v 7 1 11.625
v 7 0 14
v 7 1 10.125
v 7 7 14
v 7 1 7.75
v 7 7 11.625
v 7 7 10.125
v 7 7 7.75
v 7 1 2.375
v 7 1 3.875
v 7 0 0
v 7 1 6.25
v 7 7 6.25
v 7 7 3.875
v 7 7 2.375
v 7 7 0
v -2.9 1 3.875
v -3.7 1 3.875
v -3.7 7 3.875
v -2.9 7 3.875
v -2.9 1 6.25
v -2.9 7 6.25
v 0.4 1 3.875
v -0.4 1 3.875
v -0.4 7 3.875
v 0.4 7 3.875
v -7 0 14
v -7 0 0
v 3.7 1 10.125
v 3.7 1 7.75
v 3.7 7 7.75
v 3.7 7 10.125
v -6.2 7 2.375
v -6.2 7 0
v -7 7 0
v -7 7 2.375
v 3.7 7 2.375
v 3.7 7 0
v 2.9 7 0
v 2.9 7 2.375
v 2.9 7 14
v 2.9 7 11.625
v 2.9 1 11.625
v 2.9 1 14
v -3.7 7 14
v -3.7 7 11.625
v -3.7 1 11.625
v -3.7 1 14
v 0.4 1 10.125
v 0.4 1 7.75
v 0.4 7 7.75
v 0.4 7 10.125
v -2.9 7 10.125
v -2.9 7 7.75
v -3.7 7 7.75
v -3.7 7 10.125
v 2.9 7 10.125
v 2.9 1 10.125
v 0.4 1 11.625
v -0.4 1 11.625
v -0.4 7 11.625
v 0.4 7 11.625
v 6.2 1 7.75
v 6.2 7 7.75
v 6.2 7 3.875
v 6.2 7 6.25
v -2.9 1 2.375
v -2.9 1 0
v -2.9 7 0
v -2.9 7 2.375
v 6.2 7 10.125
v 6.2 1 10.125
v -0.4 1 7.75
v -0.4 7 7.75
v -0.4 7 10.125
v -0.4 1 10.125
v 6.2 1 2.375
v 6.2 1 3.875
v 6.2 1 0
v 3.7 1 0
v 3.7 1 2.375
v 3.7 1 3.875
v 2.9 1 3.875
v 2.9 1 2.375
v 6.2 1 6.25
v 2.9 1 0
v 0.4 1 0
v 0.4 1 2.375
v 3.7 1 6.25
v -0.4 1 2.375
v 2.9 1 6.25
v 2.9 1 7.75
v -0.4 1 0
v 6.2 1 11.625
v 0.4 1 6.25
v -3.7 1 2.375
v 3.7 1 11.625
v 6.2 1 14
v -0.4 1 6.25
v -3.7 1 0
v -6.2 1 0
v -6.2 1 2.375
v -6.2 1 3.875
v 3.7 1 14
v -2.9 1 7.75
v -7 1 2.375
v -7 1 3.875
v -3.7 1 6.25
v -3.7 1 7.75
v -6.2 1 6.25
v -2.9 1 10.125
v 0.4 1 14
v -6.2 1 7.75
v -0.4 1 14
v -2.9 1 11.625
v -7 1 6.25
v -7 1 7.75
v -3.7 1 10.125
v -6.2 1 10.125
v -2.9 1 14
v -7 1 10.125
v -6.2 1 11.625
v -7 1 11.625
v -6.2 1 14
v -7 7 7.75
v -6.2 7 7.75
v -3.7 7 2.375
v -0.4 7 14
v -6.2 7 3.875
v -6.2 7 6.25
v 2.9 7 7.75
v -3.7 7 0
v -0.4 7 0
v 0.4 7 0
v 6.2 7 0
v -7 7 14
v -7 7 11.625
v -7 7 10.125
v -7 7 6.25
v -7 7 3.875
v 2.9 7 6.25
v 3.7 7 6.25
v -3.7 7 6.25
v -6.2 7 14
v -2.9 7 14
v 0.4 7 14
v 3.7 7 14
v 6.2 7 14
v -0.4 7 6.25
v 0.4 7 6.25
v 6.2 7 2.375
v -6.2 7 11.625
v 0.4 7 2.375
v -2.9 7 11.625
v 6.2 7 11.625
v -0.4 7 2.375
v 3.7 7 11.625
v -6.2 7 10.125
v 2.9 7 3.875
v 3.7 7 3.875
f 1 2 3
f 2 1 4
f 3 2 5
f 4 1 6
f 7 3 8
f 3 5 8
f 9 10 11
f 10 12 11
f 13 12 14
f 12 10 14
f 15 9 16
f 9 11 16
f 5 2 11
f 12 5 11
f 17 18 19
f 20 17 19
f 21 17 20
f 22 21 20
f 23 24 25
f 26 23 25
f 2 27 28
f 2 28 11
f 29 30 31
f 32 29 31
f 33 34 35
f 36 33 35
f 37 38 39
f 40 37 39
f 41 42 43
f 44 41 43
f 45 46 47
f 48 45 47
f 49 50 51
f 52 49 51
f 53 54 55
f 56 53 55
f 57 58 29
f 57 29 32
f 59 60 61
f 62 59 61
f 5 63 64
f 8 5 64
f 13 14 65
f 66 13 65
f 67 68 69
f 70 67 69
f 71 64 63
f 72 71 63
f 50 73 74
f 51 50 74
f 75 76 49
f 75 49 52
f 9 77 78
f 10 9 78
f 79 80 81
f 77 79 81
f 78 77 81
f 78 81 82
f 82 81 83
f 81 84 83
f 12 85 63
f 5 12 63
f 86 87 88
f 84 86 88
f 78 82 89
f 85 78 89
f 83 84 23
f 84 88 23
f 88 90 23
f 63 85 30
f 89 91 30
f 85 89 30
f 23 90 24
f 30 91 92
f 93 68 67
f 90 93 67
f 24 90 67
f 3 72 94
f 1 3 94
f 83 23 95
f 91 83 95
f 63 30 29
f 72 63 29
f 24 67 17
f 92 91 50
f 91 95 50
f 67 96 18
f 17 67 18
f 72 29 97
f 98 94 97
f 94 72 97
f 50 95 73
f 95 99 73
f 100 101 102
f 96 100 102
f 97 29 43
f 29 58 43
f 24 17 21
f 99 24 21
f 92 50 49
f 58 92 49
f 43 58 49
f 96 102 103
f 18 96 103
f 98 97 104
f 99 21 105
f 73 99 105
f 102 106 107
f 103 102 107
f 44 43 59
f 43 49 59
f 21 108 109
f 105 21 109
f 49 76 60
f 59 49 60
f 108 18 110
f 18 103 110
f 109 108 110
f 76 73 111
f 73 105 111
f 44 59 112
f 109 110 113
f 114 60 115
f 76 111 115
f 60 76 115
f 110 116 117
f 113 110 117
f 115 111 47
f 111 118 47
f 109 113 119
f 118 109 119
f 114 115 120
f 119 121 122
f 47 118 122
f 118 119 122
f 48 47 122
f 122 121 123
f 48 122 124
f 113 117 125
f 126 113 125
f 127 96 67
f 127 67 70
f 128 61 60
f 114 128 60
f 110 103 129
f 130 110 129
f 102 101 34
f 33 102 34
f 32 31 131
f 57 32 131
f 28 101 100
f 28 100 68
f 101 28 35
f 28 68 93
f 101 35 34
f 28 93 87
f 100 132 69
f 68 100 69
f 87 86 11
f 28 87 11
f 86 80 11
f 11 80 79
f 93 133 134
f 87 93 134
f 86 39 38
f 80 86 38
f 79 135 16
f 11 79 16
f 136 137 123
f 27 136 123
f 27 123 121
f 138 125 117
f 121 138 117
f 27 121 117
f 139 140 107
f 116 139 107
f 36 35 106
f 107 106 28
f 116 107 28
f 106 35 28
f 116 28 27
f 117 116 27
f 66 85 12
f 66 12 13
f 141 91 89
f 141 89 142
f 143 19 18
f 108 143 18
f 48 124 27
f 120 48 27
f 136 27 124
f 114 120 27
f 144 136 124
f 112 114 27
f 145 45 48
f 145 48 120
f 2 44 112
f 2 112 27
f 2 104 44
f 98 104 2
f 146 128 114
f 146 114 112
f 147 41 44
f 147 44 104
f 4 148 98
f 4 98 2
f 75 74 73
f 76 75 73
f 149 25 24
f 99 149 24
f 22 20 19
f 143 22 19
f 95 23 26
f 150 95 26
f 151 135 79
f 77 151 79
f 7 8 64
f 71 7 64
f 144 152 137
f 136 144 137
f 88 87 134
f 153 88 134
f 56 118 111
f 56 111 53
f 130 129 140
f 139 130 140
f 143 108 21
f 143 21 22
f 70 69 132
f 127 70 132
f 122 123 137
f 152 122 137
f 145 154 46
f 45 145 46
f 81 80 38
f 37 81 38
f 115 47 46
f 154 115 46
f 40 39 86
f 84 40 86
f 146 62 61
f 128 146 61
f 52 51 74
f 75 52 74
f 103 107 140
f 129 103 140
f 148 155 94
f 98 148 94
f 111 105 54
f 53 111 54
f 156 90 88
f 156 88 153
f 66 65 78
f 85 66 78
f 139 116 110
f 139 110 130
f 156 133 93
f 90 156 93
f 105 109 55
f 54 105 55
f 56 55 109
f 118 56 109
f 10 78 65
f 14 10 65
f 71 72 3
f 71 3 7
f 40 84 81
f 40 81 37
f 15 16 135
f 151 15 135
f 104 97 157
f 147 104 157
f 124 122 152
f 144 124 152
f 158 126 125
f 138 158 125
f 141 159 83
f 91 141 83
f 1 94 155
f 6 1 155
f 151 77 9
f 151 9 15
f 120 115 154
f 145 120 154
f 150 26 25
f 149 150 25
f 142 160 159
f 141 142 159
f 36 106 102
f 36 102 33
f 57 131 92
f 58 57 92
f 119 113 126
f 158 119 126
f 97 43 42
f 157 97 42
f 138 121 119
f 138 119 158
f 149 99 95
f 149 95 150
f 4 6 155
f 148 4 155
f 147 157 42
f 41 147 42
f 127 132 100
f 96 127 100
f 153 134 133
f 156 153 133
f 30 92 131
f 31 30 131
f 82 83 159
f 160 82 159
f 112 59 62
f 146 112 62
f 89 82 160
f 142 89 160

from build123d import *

# Parameters (mm, degrees)
BOSS_EXTRUDE1_DEPTH = 14
SKETCH2_W           = 1.5
SKETCH2_H           = 6
CUT_EXTRUDE1_DEPTH  = 22


with BuildPart() as part:
    # Sketch1 → Boss-Extrude1 (new body)
    with BuildSketch(Plane.XY):
        Polygon((-7, 0), (7, 0), (7, 7), (6.2, 7), (6.2, 1), (3.7, 1), (3.7, 7), (2.9, 7), (2.9, 1), (0.4, 1), (0.4, 7), (-0.4, 7), (-0.4, 1), (-2.9, 1), (-2.9, 7), (-3.7, 7), (-3.7, 1), (-6.2, 1), (-6.2, 7), (-7, 7), align=None)
    extrude(amount=BOSS_EXTRUDE1_DEPTH)

    # Sketch2 → Cut-Extrude1 (cut, through all)
    with BuildSketch(Plane.ZY.offset(7)):
        with Locations((3.125, 4)):
            Rectangle(SKETCH2_W, SKETCH2_H)
        with Locations((7, 4)):
            Rectangle(SKETCH2_W, SKETCH2_H)
        with Locations((10.875, 4)):
            Rectangle(SKETCH2_W, SKETCH2_H)
    extrude(amount=-CUT_EXTRUDE1_DEPTH, mode=Mode.SUBTRACT)


solid = part.part
